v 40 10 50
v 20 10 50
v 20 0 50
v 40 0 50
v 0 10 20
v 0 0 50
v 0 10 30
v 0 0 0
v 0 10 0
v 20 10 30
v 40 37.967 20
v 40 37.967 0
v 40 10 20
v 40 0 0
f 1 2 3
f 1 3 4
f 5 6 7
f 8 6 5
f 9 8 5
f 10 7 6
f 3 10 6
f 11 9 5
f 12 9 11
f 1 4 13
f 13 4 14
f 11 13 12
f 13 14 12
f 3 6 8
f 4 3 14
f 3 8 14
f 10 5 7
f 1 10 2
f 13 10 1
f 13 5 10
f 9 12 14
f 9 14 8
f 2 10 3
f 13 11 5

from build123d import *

# Parameters (mm, degrees)
BOSS_EXTRUDE1_DEPTH = 20
SKETCH3_W           = 40
SKETCH3_H           = 10
BOSS_EXTRUDE2_DEPTH = 30
CUT_EXTRUDE2_DEPTH  = 20


with BuildPart() as part:
    # Sketch1 → Boss-Extrude1 (new body)
    with BuildSketch(Plane.XY):
        Polygon((0, 10), (40, 37.966903073), (40, 10), (40, 0), (0, 0), align=None)
    extrude(amount=BOSS_EXTRUDE1_DEPTH)

    # Sketch3 → Boss-Extrude2 (add)
    with BuildSketch(Plane.XY.offset(20)):
        with Locations((20, 5)):
            Rectangle(SKETCH3_W, SKETCH3_H)
    extrude(amount=BOSS_EXTRUDE2_DEPTH)

    # Sketch4 → Cut-Extrude2 (cut)
    with BuildSketch(Plane.ZY):
        Polygon((50, 10), (30, 10), (50, 0), align=None)
    extrude(amount=-CUT_EXTRUDE2_DEPTH, mode=Mode.SUBTRACT)


solid = part.part
